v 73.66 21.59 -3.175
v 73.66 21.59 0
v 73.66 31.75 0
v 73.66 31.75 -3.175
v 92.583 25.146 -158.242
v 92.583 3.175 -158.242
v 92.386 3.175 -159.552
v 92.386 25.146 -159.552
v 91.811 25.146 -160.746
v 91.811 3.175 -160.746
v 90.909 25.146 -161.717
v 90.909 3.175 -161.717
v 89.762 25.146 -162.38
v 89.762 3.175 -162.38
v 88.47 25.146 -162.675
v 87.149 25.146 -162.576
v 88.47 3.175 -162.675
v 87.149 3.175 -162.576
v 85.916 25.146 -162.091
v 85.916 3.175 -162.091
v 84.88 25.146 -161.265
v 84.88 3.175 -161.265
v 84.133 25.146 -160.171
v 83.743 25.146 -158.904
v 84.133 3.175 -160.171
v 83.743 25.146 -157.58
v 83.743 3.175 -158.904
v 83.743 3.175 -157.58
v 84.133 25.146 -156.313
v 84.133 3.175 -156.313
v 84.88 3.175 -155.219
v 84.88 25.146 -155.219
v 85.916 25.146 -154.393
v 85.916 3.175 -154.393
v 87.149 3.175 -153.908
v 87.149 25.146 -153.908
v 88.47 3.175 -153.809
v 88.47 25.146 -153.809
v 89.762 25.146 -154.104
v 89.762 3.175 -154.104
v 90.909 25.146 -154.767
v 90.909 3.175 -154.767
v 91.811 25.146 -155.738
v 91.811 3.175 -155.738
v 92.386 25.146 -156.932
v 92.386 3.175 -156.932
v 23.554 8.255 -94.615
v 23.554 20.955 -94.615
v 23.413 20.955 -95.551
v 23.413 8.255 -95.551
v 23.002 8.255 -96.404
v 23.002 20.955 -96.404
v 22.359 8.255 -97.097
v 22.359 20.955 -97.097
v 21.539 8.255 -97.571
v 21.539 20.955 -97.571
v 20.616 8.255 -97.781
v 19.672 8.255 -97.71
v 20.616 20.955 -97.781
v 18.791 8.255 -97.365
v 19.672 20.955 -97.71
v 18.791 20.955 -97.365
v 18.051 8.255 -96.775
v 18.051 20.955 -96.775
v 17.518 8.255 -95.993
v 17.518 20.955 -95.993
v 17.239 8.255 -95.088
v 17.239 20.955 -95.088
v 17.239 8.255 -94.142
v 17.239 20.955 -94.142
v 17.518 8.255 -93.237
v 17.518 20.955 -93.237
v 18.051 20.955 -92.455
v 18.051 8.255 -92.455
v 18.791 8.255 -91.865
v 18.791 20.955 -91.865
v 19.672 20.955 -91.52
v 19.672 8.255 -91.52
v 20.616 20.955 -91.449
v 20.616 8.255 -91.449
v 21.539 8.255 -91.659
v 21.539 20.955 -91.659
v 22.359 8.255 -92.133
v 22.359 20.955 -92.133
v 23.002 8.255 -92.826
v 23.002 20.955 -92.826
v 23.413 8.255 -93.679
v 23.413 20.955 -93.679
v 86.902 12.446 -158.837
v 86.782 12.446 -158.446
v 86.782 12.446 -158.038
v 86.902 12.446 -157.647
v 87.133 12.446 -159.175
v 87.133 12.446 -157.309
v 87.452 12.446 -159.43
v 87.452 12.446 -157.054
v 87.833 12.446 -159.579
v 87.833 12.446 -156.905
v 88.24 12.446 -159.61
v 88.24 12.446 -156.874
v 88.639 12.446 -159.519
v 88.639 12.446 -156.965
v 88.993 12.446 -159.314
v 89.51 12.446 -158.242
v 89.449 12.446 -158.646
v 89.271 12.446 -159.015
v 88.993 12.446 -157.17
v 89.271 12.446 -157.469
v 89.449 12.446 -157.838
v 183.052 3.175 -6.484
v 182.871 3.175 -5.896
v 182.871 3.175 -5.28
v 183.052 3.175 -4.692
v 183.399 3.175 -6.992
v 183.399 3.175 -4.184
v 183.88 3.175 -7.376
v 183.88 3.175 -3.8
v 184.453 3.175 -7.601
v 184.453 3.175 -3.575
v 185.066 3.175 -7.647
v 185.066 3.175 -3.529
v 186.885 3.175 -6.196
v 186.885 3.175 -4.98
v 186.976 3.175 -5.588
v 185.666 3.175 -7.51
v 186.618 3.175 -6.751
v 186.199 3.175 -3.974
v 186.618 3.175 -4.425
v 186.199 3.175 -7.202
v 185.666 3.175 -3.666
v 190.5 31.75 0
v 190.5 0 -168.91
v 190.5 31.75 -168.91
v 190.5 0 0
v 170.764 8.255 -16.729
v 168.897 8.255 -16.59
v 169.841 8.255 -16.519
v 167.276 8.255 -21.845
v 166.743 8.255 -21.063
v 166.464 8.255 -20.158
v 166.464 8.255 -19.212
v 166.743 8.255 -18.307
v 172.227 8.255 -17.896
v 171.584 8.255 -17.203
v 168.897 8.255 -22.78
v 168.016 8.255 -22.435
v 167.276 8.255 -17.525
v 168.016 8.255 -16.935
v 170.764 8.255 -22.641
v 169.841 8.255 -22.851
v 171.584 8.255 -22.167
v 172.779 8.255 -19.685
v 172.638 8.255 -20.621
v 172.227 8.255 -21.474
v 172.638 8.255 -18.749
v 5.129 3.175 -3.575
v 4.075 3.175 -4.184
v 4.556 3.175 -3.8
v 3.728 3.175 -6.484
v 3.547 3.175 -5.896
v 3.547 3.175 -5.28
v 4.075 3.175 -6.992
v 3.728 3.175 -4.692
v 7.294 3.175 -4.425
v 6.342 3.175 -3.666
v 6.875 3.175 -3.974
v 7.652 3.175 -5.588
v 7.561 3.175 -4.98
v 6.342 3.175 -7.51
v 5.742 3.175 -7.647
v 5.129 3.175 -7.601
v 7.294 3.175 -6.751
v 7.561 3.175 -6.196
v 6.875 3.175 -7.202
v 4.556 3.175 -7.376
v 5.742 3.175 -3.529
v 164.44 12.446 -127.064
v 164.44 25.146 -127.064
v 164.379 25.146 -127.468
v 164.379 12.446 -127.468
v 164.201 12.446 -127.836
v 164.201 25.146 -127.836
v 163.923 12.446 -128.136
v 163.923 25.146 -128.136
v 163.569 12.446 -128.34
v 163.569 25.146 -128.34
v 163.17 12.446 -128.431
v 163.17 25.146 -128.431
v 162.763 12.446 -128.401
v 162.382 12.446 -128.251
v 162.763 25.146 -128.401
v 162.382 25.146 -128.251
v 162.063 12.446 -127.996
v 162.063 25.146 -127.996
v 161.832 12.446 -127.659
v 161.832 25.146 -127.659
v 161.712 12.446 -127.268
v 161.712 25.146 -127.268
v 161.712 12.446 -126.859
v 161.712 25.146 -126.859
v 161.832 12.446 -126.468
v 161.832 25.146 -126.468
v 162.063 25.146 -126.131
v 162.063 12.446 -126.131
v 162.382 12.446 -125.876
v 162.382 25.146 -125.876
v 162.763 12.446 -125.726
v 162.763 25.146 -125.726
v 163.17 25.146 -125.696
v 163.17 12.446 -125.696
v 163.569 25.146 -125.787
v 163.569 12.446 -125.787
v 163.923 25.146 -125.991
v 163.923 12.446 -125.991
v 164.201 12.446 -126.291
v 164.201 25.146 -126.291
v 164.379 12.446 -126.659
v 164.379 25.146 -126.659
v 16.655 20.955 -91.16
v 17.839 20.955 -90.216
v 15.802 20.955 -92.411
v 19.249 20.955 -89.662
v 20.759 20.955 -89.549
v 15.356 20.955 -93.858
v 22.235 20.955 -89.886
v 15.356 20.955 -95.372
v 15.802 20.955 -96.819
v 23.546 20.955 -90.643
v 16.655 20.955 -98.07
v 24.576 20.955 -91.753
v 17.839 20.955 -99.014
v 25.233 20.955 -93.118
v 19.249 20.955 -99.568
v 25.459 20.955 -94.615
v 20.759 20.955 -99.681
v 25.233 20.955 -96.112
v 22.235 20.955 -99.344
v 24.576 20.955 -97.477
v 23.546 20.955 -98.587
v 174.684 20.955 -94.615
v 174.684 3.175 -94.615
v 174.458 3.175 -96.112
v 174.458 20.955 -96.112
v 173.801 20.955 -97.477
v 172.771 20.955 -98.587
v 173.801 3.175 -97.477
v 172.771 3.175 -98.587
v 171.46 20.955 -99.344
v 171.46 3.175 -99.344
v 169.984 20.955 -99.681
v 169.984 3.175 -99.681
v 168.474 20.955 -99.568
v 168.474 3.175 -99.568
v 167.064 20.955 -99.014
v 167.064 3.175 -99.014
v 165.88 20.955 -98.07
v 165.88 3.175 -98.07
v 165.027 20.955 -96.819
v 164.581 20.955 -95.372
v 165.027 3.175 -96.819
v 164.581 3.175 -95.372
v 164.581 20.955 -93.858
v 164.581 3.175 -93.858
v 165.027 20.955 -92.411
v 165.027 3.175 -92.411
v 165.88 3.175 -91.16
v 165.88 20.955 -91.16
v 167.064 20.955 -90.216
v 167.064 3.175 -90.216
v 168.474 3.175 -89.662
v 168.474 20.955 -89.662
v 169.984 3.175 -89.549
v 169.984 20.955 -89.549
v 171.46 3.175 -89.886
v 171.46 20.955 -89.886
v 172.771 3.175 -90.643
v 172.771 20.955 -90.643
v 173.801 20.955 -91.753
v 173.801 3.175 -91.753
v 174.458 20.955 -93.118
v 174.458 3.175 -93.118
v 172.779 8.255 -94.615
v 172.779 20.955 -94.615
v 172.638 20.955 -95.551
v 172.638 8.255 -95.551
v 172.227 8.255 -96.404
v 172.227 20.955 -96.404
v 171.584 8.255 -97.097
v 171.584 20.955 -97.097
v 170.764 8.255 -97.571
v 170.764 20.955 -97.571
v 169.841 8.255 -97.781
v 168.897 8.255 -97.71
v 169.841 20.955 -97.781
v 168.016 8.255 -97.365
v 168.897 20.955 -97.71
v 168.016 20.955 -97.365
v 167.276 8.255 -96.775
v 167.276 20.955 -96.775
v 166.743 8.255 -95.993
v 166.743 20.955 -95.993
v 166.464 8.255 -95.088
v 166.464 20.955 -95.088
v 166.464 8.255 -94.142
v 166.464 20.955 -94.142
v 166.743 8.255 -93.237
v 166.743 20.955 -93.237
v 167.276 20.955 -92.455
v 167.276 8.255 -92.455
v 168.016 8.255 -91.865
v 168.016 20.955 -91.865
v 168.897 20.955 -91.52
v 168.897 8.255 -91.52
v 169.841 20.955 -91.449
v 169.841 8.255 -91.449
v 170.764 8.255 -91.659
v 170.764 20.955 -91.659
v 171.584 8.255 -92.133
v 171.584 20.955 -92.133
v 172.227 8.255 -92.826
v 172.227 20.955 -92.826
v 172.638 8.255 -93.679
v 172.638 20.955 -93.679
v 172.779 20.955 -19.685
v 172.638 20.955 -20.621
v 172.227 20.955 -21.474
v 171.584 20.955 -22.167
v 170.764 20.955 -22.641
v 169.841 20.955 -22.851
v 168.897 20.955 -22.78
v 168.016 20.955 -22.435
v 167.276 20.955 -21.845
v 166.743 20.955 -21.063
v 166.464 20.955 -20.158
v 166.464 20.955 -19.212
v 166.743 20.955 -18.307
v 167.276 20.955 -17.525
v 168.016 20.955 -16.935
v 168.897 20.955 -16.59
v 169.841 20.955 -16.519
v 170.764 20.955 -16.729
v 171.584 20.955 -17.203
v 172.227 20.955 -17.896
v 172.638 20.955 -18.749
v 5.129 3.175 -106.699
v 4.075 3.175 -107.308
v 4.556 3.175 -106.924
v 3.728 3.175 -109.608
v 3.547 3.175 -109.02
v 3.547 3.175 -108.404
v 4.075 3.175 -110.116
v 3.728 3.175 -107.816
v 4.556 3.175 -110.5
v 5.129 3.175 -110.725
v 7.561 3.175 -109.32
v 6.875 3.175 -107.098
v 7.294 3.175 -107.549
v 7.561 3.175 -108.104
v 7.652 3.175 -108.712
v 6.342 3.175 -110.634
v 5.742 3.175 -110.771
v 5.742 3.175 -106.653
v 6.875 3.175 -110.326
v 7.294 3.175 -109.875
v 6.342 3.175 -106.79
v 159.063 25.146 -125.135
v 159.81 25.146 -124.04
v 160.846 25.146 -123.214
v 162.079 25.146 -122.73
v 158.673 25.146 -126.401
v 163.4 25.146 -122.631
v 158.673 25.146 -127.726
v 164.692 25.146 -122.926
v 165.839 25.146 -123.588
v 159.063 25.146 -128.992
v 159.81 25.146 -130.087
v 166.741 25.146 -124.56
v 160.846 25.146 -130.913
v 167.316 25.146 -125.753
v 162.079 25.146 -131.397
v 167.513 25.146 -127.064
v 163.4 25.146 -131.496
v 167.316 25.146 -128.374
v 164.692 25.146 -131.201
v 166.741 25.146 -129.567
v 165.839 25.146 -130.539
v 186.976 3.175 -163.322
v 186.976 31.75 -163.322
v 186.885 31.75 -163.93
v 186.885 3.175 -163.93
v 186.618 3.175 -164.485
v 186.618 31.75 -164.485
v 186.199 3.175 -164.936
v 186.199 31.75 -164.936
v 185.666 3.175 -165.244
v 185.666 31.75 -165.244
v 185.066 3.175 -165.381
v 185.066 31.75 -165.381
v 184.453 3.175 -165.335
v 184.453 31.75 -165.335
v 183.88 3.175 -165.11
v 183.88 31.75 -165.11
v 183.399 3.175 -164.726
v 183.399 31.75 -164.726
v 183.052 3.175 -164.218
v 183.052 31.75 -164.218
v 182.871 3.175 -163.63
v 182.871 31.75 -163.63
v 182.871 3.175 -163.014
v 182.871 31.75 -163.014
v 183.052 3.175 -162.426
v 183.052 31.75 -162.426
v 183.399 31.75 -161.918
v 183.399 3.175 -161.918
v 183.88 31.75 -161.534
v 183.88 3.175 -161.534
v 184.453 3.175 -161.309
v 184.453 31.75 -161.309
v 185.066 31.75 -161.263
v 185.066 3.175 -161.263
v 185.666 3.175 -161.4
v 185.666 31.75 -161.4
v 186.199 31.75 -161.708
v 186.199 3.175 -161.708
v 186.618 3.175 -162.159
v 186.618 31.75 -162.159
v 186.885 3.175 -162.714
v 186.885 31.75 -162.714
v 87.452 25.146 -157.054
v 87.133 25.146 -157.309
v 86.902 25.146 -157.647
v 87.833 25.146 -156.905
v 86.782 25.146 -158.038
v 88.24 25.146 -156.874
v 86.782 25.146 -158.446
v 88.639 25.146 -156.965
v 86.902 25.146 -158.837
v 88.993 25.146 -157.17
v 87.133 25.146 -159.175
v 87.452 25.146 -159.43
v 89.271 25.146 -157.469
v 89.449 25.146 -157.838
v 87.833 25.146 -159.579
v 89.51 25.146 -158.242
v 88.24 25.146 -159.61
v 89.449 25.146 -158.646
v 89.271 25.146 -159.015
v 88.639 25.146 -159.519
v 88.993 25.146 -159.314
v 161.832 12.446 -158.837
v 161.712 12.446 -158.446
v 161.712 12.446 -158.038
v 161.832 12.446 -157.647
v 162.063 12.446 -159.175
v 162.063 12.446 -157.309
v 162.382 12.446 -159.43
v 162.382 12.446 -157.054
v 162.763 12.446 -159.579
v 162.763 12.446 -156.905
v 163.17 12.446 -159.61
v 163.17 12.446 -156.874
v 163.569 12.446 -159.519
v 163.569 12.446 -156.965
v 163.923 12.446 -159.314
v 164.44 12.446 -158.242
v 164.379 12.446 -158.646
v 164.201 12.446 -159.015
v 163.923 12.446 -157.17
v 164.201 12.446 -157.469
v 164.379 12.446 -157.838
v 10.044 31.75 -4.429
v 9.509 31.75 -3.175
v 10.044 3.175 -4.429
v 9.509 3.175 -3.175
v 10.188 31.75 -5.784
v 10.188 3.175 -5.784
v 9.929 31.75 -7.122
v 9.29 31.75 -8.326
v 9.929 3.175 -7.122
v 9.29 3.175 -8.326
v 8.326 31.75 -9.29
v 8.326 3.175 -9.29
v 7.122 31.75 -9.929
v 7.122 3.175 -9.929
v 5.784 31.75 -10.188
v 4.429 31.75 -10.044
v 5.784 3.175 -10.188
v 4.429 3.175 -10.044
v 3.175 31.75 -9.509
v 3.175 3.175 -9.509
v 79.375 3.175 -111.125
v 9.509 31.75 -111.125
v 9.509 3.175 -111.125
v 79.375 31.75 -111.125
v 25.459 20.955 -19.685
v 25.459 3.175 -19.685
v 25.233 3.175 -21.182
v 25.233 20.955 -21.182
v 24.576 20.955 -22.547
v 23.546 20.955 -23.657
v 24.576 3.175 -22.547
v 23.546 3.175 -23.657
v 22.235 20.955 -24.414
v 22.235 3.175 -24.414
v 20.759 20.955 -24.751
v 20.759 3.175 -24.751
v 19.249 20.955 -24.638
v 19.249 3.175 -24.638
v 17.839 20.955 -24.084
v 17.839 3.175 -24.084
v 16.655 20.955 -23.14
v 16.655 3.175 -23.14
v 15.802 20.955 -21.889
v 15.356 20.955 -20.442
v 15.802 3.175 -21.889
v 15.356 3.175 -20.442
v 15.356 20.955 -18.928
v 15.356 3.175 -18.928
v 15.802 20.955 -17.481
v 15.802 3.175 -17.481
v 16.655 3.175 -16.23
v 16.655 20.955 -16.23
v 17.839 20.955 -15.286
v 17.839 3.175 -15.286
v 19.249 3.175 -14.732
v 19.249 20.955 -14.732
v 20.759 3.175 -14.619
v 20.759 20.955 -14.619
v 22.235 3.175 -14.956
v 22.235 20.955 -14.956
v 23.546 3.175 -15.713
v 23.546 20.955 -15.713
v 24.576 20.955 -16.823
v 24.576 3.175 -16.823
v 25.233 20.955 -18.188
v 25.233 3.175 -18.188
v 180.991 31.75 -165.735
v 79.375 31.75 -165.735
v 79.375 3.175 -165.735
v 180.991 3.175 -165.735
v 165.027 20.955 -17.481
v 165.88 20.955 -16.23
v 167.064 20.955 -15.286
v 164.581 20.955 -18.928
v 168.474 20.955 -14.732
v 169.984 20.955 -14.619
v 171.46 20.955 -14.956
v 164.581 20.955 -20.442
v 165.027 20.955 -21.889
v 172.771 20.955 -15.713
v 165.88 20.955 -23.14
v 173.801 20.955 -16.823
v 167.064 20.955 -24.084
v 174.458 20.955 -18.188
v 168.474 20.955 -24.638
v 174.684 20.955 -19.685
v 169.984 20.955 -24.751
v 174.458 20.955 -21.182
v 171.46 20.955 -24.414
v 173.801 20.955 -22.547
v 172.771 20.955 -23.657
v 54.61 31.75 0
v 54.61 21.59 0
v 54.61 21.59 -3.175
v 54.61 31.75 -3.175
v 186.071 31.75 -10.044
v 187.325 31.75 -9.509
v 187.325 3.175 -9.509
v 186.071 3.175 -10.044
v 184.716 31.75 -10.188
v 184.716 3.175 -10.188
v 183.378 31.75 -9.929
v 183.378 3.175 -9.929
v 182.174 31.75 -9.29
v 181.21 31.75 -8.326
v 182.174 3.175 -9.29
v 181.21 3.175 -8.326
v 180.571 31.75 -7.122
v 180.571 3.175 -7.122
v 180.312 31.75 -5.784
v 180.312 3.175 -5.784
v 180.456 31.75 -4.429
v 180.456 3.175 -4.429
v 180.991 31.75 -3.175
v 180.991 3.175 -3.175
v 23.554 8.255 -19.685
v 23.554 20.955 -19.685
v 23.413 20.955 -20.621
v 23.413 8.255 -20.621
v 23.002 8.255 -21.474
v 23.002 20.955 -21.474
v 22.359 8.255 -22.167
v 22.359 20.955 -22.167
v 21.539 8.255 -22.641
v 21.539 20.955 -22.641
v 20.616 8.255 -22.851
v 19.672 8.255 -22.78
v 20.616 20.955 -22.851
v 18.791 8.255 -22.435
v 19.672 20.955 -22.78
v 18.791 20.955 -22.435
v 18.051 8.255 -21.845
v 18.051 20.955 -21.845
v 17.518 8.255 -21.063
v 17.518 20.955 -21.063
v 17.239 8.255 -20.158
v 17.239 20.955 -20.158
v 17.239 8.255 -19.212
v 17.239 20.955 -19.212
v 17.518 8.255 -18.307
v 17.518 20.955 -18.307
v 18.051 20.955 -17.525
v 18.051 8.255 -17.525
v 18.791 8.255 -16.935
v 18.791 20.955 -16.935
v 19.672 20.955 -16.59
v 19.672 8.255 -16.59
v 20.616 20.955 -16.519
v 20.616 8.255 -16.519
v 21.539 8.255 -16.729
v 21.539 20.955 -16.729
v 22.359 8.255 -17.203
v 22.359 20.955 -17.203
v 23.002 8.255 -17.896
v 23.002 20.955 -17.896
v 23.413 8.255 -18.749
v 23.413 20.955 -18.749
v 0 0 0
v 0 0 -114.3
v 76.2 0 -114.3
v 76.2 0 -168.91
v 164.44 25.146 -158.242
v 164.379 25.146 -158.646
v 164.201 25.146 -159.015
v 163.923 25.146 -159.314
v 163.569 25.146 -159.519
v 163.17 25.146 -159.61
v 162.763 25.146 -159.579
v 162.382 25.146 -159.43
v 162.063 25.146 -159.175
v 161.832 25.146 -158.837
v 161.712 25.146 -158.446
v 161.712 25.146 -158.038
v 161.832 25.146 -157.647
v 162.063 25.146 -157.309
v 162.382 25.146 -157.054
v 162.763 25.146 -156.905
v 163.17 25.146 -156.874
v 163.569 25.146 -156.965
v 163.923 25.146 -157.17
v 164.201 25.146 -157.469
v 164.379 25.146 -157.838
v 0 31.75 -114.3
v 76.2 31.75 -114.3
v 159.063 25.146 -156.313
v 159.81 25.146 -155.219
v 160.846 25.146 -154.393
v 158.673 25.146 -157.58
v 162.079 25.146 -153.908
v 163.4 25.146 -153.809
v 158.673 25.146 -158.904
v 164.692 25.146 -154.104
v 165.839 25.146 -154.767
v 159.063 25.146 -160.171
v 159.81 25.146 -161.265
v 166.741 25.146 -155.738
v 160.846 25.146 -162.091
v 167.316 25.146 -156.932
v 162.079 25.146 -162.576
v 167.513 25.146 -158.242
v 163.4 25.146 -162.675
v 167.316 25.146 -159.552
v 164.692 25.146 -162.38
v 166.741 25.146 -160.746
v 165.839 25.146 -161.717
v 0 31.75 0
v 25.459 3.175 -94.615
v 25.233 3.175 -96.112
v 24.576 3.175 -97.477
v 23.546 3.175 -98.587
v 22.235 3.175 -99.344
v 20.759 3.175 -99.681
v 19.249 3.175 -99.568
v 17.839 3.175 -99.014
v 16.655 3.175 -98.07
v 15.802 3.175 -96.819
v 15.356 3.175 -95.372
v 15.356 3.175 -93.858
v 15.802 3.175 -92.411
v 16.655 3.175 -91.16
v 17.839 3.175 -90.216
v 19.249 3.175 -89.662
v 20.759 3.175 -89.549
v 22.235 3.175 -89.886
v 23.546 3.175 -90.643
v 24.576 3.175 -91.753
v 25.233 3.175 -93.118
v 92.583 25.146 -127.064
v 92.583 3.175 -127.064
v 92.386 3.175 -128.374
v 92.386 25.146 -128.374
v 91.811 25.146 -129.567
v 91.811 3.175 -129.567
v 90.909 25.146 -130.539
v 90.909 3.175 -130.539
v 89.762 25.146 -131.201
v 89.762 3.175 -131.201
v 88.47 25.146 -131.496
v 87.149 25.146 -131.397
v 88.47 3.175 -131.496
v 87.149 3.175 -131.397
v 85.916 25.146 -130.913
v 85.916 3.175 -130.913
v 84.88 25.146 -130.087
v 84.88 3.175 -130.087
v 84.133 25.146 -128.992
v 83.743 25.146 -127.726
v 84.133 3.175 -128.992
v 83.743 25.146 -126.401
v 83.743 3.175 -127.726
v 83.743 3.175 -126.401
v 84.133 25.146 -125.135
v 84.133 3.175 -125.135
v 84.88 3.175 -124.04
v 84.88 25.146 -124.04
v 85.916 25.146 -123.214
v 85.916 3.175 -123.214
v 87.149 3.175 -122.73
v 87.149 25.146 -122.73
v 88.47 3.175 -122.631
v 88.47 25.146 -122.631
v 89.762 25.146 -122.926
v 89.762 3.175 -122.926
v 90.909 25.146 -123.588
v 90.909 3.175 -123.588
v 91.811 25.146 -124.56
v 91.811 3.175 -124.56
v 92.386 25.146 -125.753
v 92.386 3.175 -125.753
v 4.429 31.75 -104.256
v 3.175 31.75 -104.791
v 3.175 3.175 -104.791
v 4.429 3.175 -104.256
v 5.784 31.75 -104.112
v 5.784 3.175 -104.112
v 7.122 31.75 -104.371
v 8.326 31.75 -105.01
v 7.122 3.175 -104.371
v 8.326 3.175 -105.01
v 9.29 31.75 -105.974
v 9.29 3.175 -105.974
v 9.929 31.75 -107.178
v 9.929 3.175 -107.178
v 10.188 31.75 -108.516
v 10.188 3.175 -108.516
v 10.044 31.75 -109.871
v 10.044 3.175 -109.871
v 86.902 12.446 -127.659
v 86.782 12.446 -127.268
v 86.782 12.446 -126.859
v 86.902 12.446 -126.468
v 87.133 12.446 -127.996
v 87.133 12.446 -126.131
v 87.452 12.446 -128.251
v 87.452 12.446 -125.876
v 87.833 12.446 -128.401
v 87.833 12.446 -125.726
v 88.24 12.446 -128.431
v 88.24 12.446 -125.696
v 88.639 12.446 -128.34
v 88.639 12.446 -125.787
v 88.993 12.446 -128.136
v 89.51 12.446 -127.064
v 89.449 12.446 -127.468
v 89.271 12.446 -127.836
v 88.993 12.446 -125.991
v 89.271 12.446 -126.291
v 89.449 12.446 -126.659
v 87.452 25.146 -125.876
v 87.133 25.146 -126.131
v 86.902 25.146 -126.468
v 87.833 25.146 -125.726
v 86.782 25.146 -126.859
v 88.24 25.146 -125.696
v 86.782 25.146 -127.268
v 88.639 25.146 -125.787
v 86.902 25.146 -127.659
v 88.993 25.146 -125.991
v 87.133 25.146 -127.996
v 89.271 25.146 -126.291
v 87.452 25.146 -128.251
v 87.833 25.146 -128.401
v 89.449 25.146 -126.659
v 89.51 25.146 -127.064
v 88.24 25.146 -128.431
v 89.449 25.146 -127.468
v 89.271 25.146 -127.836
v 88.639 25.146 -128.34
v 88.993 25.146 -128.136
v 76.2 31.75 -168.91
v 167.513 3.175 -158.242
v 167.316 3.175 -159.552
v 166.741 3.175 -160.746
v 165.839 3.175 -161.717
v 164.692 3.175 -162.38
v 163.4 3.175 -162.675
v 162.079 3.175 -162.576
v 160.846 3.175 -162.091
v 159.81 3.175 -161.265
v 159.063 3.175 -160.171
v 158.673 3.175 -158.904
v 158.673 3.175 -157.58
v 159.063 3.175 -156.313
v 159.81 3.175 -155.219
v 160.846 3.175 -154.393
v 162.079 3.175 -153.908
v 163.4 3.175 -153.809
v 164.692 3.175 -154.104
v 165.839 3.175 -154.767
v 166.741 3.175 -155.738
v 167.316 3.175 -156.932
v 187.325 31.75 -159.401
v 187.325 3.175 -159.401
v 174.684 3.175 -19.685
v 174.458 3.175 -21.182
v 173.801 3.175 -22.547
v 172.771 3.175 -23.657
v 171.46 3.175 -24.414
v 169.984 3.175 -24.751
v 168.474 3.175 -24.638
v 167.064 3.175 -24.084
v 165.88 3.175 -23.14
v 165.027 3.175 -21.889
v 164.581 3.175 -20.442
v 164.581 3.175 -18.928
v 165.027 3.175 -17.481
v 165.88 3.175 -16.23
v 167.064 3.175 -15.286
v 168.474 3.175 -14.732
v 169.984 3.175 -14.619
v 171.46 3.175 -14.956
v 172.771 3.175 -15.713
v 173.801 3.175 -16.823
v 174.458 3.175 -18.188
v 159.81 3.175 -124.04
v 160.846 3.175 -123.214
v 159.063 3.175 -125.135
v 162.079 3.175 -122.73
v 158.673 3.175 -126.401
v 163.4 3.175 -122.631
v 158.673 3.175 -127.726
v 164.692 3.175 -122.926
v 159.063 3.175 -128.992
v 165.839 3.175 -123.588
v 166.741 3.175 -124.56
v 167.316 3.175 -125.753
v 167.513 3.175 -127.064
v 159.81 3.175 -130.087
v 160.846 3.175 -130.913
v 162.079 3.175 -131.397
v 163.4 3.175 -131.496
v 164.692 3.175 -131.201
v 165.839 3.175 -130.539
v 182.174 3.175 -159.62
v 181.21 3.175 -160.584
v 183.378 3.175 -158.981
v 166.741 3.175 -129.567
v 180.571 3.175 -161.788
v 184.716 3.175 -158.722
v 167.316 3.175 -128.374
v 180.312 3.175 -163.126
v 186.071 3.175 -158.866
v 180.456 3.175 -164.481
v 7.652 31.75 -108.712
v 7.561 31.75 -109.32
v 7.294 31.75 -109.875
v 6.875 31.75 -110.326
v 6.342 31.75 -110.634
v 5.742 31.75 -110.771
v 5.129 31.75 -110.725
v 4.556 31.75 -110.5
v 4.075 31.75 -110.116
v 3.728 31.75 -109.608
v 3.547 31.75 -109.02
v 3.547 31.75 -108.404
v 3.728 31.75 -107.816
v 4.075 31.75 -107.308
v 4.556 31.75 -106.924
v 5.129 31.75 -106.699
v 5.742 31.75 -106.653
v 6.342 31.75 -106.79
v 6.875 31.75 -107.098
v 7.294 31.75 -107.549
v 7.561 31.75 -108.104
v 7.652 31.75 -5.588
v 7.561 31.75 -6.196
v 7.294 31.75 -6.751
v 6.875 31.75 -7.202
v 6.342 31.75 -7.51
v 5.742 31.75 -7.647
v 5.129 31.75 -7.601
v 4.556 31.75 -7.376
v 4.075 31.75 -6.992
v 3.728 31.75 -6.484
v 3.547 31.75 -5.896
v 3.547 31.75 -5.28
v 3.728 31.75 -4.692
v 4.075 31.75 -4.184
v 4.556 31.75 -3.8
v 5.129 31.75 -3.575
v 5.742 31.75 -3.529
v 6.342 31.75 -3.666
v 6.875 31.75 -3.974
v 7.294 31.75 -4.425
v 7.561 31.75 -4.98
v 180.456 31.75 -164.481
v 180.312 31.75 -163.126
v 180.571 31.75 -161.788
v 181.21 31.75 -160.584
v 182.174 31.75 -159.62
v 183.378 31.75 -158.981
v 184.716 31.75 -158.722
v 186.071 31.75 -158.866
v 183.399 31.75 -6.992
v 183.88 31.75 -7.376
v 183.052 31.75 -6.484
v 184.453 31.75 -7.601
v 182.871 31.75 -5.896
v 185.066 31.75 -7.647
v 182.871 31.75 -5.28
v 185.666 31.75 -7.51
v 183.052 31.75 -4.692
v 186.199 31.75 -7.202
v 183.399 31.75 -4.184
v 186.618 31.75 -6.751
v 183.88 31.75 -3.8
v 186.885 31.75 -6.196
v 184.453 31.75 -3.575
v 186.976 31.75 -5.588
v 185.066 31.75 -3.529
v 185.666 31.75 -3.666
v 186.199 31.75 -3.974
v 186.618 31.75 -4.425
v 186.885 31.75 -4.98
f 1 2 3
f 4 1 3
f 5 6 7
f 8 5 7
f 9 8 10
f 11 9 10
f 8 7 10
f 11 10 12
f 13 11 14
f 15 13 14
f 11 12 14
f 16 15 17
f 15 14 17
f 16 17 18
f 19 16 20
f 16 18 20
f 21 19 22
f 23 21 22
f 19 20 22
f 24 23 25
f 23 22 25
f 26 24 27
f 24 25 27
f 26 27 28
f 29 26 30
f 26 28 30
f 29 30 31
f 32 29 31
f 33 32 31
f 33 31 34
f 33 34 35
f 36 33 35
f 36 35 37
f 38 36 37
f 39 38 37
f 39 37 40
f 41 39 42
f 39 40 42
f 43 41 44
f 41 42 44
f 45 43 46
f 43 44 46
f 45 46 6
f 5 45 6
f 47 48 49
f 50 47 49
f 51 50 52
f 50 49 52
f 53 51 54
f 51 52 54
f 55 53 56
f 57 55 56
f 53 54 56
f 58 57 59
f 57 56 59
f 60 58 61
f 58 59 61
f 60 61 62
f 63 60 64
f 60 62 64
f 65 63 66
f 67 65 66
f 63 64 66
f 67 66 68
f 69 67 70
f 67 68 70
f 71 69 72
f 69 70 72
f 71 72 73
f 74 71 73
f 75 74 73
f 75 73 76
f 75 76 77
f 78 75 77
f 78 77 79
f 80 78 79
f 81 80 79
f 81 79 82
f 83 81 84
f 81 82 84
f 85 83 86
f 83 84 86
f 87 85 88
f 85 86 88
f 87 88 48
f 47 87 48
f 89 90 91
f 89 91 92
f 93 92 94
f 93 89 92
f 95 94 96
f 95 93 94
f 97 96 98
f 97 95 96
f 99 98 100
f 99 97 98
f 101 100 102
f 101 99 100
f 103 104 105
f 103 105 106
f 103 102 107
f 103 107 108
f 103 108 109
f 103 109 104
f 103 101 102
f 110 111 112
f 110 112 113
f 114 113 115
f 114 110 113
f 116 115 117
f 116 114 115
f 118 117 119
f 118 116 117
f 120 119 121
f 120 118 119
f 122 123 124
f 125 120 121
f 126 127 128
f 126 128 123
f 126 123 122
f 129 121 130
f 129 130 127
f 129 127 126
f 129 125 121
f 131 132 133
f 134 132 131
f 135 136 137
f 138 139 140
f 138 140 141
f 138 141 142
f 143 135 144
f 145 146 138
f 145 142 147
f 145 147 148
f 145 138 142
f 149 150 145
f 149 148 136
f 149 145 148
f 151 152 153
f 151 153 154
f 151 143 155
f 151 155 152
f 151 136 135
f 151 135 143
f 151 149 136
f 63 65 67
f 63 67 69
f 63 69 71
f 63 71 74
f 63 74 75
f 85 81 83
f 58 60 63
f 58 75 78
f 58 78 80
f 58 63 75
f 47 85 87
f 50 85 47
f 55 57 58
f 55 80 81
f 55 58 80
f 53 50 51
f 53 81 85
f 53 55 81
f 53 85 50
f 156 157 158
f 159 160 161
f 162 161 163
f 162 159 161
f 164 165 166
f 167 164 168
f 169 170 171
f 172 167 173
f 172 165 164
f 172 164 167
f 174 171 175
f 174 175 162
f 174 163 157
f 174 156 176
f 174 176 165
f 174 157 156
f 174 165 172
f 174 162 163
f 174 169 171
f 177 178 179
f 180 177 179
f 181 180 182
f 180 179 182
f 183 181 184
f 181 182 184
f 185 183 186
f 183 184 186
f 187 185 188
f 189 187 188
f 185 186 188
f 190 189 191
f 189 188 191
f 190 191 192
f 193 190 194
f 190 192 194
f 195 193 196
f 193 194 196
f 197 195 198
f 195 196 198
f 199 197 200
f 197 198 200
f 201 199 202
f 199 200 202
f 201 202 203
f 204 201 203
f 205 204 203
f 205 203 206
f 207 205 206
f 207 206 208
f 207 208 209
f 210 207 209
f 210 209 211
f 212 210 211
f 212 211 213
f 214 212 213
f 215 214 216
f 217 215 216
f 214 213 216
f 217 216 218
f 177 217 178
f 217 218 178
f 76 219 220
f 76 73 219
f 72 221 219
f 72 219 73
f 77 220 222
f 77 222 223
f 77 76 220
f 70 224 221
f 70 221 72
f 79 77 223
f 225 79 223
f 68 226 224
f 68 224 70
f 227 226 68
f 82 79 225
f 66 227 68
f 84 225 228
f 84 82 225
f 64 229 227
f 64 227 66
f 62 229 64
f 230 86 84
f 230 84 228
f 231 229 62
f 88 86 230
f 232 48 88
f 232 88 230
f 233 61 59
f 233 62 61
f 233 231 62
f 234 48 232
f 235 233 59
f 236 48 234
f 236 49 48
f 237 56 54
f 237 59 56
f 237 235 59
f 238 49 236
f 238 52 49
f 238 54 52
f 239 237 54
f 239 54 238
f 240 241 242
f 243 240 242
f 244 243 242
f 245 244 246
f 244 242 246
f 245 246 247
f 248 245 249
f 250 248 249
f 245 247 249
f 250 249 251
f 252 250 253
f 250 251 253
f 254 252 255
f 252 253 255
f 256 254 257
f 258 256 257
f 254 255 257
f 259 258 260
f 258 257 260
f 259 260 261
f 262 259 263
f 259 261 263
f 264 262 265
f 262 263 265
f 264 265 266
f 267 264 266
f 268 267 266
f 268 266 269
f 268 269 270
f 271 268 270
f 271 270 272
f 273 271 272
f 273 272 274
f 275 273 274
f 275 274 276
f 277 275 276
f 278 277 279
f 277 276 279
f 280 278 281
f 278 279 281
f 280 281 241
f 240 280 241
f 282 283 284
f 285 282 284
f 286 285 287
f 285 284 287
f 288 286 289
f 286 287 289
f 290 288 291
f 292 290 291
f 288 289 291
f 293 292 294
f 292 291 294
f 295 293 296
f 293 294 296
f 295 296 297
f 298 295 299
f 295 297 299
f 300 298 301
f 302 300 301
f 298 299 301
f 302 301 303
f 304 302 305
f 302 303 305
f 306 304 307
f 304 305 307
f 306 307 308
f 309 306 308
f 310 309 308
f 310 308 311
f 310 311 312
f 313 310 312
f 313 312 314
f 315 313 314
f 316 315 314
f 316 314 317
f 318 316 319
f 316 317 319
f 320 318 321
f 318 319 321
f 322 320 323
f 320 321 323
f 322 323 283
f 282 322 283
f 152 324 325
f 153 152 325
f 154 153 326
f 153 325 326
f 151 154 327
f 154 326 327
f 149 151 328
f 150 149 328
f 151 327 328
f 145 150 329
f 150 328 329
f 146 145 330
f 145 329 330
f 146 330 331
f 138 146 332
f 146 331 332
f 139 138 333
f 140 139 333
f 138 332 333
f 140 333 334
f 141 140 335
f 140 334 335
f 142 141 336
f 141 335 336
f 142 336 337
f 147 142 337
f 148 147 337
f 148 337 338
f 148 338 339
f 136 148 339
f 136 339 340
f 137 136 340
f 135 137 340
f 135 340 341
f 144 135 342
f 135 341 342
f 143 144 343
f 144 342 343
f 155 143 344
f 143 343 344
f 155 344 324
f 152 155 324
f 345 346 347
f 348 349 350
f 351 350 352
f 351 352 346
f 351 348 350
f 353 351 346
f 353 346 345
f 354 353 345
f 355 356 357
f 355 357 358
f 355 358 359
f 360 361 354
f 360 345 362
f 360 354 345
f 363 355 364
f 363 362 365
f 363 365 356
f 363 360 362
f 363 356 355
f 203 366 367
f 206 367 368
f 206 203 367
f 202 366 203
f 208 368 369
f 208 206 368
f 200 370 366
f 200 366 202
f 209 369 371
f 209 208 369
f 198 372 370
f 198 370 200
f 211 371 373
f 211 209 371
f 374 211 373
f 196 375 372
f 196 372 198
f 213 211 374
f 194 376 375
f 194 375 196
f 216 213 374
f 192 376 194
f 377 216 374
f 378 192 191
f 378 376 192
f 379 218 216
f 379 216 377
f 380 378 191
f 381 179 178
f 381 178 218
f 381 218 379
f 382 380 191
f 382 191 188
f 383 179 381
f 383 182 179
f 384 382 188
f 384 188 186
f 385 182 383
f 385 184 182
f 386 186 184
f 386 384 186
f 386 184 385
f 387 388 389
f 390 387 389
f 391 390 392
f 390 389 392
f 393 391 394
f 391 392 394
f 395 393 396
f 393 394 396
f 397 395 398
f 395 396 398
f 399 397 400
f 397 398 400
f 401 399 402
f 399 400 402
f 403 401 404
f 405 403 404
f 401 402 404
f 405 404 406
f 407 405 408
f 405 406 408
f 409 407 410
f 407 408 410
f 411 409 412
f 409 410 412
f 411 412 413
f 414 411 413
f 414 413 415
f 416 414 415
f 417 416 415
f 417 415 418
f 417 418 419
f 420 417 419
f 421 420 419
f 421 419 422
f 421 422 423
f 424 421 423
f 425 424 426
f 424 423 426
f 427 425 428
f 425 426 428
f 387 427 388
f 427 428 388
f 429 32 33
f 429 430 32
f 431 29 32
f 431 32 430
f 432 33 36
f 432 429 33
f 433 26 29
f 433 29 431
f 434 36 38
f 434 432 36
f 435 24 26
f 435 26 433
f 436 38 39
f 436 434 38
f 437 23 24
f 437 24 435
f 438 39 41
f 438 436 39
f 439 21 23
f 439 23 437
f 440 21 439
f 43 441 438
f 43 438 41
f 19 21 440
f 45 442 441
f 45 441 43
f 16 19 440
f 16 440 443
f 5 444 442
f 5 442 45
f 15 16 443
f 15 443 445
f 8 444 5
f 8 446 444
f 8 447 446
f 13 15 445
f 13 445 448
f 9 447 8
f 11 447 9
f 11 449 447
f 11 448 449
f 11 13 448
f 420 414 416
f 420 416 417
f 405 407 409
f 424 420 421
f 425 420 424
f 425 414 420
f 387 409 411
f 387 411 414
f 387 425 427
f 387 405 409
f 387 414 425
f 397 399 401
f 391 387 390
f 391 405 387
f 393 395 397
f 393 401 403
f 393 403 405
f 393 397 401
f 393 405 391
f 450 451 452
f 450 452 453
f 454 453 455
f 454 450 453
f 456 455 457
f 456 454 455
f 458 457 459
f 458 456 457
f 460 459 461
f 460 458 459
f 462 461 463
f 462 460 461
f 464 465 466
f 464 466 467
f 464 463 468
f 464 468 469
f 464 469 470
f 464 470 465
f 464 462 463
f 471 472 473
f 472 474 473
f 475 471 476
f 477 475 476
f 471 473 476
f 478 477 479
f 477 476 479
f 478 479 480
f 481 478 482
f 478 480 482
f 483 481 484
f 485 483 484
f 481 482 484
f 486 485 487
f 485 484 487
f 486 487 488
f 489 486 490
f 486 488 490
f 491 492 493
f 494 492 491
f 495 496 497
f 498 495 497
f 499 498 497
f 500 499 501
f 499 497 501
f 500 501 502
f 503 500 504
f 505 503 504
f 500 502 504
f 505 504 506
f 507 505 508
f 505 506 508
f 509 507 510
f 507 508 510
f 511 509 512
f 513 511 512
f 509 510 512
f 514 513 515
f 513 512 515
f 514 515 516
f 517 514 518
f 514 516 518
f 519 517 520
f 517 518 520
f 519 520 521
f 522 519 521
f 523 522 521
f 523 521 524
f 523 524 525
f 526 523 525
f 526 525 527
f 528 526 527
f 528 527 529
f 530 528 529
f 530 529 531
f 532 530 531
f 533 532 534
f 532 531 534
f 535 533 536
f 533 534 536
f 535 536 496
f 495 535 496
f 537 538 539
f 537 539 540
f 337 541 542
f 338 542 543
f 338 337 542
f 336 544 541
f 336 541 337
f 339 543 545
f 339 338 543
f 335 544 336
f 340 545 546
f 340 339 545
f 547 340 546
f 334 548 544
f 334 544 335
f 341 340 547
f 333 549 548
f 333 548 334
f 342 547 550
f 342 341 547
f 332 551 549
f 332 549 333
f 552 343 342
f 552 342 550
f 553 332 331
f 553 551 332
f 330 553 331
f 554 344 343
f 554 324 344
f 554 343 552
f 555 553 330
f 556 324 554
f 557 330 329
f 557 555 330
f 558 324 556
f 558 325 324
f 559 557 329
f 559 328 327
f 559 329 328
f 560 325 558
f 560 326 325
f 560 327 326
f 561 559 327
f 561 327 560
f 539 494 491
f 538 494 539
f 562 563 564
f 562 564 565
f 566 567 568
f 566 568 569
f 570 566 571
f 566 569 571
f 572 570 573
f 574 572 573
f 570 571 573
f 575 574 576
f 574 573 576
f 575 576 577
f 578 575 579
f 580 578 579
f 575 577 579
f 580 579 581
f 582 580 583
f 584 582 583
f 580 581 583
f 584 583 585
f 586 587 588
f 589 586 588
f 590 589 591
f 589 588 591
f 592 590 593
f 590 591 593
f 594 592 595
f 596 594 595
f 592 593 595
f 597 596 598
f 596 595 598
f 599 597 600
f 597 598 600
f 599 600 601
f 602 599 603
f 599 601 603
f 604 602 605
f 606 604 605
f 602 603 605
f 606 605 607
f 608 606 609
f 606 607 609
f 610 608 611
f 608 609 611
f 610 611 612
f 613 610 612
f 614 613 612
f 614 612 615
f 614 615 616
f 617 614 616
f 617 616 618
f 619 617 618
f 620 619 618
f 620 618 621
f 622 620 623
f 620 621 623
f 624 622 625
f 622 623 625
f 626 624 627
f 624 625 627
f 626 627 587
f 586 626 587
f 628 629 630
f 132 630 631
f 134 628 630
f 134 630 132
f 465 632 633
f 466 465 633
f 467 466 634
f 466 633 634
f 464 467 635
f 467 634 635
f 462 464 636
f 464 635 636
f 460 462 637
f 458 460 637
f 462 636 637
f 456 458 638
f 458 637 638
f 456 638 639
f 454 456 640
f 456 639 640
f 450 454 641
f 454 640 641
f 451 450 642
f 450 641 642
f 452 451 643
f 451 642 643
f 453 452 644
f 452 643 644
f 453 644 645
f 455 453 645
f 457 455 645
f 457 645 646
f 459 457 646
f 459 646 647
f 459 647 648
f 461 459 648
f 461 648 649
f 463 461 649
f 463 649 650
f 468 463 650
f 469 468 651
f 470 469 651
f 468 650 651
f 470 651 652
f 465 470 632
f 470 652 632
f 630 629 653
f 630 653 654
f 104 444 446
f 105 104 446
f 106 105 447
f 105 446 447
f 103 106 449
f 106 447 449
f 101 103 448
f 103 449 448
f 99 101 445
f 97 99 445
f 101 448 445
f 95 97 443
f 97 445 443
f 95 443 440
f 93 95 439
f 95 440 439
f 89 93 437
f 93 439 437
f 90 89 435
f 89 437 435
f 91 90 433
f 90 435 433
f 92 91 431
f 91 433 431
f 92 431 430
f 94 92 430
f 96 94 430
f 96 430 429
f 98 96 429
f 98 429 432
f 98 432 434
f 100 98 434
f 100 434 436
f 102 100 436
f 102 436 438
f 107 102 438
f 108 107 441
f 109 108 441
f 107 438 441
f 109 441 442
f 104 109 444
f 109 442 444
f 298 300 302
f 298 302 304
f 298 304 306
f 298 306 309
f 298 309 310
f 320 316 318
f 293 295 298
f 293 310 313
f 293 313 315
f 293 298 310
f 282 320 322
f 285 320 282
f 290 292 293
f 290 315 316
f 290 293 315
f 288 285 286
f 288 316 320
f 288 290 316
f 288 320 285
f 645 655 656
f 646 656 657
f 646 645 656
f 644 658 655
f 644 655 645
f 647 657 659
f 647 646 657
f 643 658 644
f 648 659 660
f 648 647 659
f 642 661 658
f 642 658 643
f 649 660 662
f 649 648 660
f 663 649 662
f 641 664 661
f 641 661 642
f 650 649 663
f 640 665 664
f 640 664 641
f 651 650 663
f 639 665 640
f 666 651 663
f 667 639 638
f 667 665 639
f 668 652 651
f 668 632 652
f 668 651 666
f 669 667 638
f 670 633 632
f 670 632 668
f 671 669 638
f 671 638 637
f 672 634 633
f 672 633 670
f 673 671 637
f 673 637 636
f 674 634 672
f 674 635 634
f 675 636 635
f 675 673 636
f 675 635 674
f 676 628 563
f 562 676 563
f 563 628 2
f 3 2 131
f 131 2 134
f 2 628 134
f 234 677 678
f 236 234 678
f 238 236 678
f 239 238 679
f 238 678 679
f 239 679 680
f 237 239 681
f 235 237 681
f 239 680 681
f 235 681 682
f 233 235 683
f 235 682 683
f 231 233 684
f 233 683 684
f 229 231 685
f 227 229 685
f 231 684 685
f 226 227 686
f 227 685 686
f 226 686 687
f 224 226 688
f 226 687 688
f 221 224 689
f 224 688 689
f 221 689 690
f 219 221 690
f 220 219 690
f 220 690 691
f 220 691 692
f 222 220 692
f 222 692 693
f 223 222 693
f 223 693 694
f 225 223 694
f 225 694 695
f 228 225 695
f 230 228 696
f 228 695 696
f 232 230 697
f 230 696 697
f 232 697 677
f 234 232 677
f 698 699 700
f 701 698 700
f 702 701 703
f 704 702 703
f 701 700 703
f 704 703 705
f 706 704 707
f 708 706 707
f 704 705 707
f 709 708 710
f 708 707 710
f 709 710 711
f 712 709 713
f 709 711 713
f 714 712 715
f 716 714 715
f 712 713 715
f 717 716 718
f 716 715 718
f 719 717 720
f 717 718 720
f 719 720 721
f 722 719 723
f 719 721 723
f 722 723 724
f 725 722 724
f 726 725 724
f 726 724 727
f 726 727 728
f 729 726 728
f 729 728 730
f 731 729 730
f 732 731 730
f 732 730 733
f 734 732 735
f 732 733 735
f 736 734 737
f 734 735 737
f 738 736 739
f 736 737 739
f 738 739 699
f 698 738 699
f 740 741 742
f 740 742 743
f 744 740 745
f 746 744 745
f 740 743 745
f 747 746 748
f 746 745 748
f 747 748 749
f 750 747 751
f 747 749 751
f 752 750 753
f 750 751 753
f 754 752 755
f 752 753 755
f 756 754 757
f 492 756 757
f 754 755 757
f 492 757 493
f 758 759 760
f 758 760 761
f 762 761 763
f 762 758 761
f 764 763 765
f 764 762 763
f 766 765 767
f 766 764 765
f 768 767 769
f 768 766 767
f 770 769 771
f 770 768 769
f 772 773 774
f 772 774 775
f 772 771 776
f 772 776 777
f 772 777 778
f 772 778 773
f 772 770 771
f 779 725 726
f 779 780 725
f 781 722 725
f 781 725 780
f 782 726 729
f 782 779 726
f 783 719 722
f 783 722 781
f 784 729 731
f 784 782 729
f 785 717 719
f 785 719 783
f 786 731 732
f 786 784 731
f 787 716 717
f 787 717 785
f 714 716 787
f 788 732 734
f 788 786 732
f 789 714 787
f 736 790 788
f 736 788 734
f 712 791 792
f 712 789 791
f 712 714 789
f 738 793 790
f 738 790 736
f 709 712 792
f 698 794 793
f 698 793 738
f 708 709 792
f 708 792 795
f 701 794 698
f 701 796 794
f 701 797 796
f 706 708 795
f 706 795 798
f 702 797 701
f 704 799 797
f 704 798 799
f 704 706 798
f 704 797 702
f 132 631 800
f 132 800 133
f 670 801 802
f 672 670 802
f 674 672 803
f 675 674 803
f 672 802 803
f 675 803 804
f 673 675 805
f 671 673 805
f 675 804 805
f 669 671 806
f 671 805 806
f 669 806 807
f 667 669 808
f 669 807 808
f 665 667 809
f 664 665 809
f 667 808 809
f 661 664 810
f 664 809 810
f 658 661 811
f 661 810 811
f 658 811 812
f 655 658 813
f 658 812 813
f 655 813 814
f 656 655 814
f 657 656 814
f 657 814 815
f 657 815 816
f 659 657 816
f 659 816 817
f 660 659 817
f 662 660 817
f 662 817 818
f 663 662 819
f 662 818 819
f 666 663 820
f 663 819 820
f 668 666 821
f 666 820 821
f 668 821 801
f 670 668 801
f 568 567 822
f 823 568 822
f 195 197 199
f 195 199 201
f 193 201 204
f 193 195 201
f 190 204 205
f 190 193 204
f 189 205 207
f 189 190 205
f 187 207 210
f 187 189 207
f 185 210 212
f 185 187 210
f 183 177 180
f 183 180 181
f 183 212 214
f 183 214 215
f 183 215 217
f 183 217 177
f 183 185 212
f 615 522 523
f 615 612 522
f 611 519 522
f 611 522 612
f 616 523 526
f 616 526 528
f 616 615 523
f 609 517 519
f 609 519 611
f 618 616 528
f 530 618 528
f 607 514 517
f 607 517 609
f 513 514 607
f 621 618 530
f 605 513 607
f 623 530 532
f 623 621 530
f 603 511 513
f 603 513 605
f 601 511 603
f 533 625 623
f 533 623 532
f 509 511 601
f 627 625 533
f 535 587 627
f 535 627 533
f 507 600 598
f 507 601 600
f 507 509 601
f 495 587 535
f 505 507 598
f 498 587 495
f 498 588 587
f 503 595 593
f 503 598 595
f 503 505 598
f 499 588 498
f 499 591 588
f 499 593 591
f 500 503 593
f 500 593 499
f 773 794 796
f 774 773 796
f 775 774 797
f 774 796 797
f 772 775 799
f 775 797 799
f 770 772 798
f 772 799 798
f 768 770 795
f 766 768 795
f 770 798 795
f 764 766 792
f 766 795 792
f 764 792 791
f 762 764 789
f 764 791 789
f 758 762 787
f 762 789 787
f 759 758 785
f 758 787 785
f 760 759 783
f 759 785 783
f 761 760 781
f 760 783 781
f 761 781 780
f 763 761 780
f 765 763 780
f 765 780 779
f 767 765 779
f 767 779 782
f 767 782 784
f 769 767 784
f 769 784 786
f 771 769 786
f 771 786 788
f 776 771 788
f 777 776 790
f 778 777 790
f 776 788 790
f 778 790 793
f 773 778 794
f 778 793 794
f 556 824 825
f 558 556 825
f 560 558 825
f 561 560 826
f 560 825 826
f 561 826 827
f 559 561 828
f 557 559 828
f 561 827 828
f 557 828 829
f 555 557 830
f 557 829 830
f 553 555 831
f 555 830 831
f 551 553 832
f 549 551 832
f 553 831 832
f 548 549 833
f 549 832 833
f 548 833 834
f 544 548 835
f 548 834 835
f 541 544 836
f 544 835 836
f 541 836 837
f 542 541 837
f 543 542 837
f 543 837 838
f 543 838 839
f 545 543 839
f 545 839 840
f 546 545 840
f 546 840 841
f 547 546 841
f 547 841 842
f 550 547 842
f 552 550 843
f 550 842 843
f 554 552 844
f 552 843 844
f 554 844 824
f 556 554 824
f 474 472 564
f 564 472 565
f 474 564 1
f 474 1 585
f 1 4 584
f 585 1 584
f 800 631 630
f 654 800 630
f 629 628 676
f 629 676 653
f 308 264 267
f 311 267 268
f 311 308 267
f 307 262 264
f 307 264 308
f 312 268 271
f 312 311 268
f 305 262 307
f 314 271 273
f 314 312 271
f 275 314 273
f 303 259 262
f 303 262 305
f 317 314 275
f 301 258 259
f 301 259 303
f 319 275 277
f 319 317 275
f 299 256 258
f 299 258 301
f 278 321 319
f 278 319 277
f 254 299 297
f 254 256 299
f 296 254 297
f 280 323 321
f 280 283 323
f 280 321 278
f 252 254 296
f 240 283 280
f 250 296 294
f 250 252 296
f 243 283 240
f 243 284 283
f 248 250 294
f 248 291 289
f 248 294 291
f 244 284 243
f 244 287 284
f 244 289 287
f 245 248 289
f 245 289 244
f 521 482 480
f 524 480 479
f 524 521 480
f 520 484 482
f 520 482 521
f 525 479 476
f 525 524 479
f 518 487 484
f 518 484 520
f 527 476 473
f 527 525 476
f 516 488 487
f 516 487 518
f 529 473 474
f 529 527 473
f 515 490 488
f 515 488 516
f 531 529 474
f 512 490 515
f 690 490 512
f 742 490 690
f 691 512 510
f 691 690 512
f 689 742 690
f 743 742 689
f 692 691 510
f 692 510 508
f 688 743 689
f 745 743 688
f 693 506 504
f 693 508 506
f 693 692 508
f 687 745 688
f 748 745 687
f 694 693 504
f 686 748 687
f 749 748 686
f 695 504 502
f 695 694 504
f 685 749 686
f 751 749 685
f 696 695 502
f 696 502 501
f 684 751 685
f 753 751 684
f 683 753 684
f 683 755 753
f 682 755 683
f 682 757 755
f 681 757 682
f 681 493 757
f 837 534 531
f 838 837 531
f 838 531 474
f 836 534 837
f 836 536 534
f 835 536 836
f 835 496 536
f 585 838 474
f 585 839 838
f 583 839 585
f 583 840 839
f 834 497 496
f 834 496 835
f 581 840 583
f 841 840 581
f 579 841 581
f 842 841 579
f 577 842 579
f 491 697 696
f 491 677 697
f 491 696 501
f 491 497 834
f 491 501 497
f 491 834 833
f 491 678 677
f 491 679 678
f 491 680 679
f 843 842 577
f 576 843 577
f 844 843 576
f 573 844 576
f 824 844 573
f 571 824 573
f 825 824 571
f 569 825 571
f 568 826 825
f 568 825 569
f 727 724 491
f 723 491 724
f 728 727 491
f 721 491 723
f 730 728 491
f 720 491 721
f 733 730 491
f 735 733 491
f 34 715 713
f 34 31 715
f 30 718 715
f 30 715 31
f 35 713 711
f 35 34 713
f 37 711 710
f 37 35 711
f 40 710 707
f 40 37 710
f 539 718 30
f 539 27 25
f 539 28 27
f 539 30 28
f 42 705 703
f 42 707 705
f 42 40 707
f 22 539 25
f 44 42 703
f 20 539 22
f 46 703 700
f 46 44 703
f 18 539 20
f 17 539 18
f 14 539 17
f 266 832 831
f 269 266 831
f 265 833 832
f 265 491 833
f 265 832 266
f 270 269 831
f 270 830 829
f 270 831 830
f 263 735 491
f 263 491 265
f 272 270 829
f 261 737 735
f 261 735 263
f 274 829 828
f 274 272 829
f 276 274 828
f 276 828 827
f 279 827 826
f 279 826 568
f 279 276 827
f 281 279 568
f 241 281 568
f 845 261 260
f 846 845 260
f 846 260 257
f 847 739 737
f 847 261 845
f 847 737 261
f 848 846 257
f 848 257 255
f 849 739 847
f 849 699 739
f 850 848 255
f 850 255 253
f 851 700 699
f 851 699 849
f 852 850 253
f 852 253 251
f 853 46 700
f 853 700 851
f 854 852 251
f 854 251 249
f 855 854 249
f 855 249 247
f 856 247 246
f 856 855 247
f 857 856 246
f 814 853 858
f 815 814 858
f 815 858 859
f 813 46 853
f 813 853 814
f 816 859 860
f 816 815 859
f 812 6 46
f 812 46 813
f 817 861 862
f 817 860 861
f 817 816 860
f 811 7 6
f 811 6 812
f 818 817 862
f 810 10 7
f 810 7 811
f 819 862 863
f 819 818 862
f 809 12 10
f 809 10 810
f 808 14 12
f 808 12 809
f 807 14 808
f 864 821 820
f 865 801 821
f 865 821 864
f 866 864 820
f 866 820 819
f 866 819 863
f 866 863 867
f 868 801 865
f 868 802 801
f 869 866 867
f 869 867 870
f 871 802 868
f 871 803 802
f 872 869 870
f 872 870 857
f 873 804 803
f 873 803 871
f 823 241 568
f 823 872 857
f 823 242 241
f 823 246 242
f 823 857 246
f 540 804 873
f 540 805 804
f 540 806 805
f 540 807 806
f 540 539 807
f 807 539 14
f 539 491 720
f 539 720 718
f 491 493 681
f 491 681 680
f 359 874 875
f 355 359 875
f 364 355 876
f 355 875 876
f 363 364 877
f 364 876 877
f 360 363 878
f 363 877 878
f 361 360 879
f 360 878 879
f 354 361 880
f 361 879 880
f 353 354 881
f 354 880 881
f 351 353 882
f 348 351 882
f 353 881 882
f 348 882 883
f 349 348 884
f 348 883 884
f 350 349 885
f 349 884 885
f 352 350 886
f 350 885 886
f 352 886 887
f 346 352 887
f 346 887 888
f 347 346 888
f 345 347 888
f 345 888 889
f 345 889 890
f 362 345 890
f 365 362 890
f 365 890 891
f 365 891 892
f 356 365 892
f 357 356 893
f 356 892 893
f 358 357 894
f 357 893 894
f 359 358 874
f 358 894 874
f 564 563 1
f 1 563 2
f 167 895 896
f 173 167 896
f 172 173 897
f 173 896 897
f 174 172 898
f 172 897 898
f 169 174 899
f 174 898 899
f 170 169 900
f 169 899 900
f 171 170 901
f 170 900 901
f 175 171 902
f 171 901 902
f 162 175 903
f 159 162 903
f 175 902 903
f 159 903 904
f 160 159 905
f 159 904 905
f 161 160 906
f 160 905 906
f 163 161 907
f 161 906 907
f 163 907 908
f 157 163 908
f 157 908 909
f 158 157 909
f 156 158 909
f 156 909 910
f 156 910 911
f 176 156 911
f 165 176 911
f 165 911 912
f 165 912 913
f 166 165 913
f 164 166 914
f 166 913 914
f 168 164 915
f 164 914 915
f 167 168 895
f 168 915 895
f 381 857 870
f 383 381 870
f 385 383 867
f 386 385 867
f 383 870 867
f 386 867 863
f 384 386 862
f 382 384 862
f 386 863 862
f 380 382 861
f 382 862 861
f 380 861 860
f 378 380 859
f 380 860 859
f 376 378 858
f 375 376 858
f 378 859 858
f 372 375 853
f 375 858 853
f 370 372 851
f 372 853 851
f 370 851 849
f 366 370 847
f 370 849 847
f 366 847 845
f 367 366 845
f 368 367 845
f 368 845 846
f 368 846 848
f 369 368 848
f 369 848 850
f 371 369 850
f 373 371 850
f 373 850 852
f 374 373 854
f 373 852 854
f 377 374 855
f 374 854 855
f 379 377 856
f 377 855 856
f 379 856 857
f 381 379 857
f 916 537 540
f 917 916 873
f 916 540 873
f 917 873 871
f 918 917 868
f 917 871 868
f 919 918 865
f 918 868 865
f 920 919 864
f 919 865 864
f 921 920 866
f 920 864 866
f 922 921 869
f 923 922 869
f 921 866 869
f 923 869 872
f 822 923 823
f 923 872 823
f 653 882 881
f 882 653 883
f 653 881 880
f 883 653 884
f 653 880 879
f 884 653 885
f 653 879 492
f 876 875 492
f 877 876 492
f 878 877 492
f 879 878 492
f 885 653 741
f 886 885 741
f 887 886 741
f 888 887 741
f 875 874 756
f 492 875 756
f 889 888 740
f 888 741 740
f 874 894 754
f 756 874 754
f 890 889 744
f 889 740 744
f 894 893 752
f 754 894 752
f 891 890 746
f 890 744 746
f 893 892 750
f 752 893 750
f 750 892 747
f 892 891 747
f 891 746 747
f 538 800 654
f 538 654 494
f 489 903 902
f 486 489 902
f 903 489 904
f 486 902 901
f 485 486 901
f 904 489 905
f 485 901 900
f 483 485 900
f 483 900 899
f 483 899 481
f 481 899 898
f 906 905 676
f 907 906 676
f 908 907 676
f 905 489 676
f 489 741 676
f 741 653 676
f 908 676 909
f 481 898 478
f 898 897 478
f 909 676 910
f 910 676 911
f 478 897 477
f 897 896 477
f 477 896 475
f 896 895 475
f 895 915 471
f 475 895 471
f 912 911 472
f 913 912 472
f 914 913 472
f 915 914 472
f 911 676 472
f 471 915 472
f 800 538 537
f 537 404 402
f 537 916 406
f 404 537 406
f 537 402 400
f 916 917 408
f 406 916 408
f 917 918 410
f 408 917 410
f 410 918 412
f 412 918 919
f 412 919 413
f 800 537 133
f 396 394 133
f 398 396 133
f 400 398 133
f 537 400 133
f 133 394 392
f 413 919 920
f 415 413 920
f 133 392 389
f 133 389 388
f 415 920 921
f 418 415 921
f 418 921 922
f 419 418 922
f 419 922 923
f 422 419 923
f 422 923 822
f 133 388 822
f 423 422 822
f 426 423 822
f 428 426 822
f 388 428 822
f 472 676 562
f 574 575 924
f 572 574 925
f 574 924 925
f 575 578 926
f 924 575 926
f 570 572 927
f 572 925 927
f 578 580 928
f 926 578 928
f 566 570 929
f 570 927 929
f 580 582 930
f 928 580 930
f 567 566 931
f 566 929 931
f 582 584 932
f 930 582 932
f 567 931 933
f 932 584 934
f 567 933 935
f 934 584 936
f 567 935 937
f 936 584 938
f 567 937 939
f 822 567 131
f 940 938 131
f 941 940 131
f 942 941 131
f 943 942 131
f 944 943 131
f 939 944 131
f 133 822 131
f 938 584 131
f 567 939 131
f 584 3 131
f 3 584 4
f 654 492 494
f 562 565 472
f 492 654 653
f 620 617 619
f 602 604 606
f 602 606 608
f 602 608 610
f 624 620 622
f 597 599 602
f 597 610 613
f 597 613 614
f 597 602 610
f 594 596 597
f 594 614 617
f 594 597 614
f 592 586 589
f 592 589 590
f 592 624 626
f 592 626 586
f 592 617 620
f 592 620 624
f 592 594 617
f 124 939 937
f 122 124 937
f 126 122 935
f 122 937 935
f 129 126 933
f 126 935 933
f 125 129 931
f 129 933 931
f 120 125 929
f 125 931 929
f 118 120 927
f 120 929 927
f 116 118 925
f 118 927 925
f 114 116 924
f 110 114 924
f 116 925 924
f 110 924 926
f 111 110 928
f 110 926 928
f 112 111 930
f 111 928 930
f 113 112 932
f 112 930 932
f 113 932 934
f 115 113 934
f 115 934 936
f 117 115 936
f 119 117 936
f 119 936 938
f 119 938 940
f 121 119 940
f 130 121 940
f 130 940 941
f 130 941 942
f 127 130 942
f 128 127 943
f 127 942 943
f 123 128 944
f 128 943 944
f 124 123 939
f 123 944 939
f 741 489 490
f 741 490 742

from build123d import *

# Parameters (mm, degrees)
SKETCH1_W           = 190.5
SKETCH1_H           = 114.3
BOSS_EXTRUDE1_DEPTH = 31.75
SKETCH2_W           = 184.15
SKETCH2_H           = 107.95
CUT_EXTRUDE1_DEPTH  = 28.575
SKETCH3_R           = 5.08
BOSS_EXTRUDE2_DEPTH = 17.78
SKETCH4_R           = 3.175
CUT_EXTRUDE2_DEPTH  = 12.7
SKETCH5_W           = 19.05
SKETCH5_H           = 25.4
CUT_EXTRUDE3_DEPTH  = 12.7
SKETCH6_W           = 114.3
SKETCH6_H           = 54.61
BOSS_EXTRUDE3_DEPTH = 31.75
SKETCH7_W           = 107.95
SKETCH7_H           = 58.521622115
CUT_EXTRUDE4_DEPTH  = 28.575
SKETCH8_R           = 4.445
BOSS_EXTRUDE4_DEPTH = 21.971
SKETCH10_R          = 1.3716
CUT_EXTRUDE5_DEPTH  = 12.7
SKETCH11_R          = 4.604419826
BOSS_EXTRUDE5_DEPTH = 28.575
SKETCH12_R          = 2.064419826
CUT_EXTRUDE6_DEPTH  = 28.575


with BuildPart() as part:
    # Sketch1 → Boss-Extrude1 (new body)
    with BuildSketch(Plane(origin=(0, 0, 0), x_dir=(1, 0, 0), z_dir=(0, 1, 0))):
        with Locations((95.25, 57.15)):
            Rectangle(SKETCH1_W, SKETCH1_H)
    extrude(amount=BOSS_EXTRUDE1_DEPTH)

    # Sketch2 → Cut-Extrude1 (cut)
    with BuildSketch(Plane(origin=(0, 31.75, 0), x_dir=(1, 0, 0), z_dir=(0, 1, 0))):
        with Locations((95.25, 57.15)):
            Rectangle(SKETCH2_W, SKETCH2_H)
    extrude(amount=-CUT_EXTRUDE1_DEPTH, mode=Mode.SUBTRACT)

    # Sketch3 → Boss-Extrude2 (add)
    with BuildSketch(Plane(origin=(0, 3.175, 0), x_dir=(1, 0, 0), z_dir=(0, 1, 0))):
        with Locations((20.378923162, 94.615)):
            Circle(SKETCH3_R)
        with Locations((169.603923162, 94.615)):
            Circle(SKETCH3_R)
        with Locations((169.603923162, 19.685)):
            Circle(SKETCH3_R)
        with Locations((20.378923162, 19.685)):
            Circle(SKETCH3_R)
    extrude(amount=BOSS_EXTRUDE2_DEPTH)

    # Sketch4 → Cut-Extrude2 (cut)
    with BuildSketch(Plane(origin=(0, 20.955, 0), x_dir=(1, 0, 0), z_dir=(0, 1, 0))):
        with Locations((20.378923162, 94.615)):
            Circle(SKETCH4_R)
        with Locations((169.603923162, 94.615)):
            Circle(SKETCH4_R)
        with Locations((20.378923162, 19.685)):
            Circle(SKETCH4_R)
        with Locations((169.603923162, 19.685)):
            Circle(SKETCH4_R)
    extrude(amount=-CUT_EXTRUDE2_DEPTH, mode=Mode.SUBTRACT)

    # Sketch5 → Cut-Extrude3 (cut)
    with BuildSketch(Plane.XY):
        with Locations((64.135, 34.29)):
            Rectangle(SKETCH5_W, SKETCH5_H)
    extrude(amount=-CUT_EXTRUDE3_DEPTH, mode=Mode.SUBTRACT)

    # Sketch6 → Boss-Extrude3 (add)
    with BuildSketch(Plane.XZ):
        with Locations((133.35, -141.605)):
            Rectangle(SKETCH6_W, SKETCH6_H)
    extrude(amount=-BOSS_EXTRUDE3_DEPTH)

    # Sketch7 → Cut-Extrude4 (cut)
    with BuildSketch(Plane(origin=(0, 31.75, 0), x_dir=(1, 0, 0), z_dir=(0, 1, 0))):
        with Locations((133.35, 136.474188943)):
            Rectangle(SKETCH7_W, SKETCH7_H)
    extrude(amount=-CUT_EXTRUDE4_DEPTH, mode=Mode.SUBTRACT)

    # Sketch8 → Boss-Extrude4 (add)
    with BuildSketch(Plane(origin=(0, 3.175, 0), x_dir=(1, 0, 0), z_dir=(0, 1, 0))):
        with Locations((88.138, 127.0635)):
            Circle(SKETCH8_R)
        with Locations((163.068, 127.0635)):
            Circle(SKETCH8_R)
        with Locations((163.068, 158.242)):
            Circle(SKETCH8_R)
        with Locations((88.138, 158.242)):
            Circle(SKETCH8_R)
    extrude(amount=BOSS_EXTRUDE4_DEPTH)

    # Sketch10 → Cut-Extrude5 (cut)
    with BuildSketch(Plane(origin=(0, 25.146, 0), x_dir=(1, 0, 0), z_dir=(0, 1, 0))):
        with Locations((163.068, 127.0635)):
            Circle(SKETCH10_R)
        with Locations((88.138, 127.0635)):
            Circle(SKETCH10_R)
        with Locations((88.138, 158.242)):
            Circle(SKETCH10_R)
        with Locations((163.068, 158.242)):
            Circle(SKETCH10_R)
    extrude(amount=-CUT_EXTRUDE5_DEPTH, mode=Mode.SUBTRACT)

    # Sketch11 → Boss-Extrude5 (add)
    with BuildSketch(Plane(origin=(0, 3.175, 0), x_dir=(1, 0, 0), z_dir=(0, 1, 0))):
        with Locations((184.912, 5.588)):
            Circle(SKETCH11_R)
        with Locations((5.588, 5.588)):
            Circle(SKETCH11_R)
        with Locations((5.588, 108.712)):
            Circle(SKETCH11_R)
        with Locations((184.912, 163.322)):
            Circle(SKETCH11_R)
    extrude(amount=BOSS_EXTRUDE5_DEPTH)

    # Sketch12 → Cut-Extrude6 (cut)
    with BuildSketch(Plane(origin=(0, 31.75, 0), x_dir=(1, 0, 0), z_dir=(0, 1, 0))):
        with Locations((184.912, 5.588)):
            Circle(SKETCH12_R)
        with Locations((5.588, 5.588)):
            Circle(SKETCH12_R)
        with Locations((5.588, 108.712)):
            Circle(SKETCH12_R)
        with Locations((184.912, 163.322)):
            Circle(SKETCH12_R)
    extrude(amount=-CUT_EXTRUDE6_DEPTH, mode=Mode.SUBTRACT)


solid = part.part
